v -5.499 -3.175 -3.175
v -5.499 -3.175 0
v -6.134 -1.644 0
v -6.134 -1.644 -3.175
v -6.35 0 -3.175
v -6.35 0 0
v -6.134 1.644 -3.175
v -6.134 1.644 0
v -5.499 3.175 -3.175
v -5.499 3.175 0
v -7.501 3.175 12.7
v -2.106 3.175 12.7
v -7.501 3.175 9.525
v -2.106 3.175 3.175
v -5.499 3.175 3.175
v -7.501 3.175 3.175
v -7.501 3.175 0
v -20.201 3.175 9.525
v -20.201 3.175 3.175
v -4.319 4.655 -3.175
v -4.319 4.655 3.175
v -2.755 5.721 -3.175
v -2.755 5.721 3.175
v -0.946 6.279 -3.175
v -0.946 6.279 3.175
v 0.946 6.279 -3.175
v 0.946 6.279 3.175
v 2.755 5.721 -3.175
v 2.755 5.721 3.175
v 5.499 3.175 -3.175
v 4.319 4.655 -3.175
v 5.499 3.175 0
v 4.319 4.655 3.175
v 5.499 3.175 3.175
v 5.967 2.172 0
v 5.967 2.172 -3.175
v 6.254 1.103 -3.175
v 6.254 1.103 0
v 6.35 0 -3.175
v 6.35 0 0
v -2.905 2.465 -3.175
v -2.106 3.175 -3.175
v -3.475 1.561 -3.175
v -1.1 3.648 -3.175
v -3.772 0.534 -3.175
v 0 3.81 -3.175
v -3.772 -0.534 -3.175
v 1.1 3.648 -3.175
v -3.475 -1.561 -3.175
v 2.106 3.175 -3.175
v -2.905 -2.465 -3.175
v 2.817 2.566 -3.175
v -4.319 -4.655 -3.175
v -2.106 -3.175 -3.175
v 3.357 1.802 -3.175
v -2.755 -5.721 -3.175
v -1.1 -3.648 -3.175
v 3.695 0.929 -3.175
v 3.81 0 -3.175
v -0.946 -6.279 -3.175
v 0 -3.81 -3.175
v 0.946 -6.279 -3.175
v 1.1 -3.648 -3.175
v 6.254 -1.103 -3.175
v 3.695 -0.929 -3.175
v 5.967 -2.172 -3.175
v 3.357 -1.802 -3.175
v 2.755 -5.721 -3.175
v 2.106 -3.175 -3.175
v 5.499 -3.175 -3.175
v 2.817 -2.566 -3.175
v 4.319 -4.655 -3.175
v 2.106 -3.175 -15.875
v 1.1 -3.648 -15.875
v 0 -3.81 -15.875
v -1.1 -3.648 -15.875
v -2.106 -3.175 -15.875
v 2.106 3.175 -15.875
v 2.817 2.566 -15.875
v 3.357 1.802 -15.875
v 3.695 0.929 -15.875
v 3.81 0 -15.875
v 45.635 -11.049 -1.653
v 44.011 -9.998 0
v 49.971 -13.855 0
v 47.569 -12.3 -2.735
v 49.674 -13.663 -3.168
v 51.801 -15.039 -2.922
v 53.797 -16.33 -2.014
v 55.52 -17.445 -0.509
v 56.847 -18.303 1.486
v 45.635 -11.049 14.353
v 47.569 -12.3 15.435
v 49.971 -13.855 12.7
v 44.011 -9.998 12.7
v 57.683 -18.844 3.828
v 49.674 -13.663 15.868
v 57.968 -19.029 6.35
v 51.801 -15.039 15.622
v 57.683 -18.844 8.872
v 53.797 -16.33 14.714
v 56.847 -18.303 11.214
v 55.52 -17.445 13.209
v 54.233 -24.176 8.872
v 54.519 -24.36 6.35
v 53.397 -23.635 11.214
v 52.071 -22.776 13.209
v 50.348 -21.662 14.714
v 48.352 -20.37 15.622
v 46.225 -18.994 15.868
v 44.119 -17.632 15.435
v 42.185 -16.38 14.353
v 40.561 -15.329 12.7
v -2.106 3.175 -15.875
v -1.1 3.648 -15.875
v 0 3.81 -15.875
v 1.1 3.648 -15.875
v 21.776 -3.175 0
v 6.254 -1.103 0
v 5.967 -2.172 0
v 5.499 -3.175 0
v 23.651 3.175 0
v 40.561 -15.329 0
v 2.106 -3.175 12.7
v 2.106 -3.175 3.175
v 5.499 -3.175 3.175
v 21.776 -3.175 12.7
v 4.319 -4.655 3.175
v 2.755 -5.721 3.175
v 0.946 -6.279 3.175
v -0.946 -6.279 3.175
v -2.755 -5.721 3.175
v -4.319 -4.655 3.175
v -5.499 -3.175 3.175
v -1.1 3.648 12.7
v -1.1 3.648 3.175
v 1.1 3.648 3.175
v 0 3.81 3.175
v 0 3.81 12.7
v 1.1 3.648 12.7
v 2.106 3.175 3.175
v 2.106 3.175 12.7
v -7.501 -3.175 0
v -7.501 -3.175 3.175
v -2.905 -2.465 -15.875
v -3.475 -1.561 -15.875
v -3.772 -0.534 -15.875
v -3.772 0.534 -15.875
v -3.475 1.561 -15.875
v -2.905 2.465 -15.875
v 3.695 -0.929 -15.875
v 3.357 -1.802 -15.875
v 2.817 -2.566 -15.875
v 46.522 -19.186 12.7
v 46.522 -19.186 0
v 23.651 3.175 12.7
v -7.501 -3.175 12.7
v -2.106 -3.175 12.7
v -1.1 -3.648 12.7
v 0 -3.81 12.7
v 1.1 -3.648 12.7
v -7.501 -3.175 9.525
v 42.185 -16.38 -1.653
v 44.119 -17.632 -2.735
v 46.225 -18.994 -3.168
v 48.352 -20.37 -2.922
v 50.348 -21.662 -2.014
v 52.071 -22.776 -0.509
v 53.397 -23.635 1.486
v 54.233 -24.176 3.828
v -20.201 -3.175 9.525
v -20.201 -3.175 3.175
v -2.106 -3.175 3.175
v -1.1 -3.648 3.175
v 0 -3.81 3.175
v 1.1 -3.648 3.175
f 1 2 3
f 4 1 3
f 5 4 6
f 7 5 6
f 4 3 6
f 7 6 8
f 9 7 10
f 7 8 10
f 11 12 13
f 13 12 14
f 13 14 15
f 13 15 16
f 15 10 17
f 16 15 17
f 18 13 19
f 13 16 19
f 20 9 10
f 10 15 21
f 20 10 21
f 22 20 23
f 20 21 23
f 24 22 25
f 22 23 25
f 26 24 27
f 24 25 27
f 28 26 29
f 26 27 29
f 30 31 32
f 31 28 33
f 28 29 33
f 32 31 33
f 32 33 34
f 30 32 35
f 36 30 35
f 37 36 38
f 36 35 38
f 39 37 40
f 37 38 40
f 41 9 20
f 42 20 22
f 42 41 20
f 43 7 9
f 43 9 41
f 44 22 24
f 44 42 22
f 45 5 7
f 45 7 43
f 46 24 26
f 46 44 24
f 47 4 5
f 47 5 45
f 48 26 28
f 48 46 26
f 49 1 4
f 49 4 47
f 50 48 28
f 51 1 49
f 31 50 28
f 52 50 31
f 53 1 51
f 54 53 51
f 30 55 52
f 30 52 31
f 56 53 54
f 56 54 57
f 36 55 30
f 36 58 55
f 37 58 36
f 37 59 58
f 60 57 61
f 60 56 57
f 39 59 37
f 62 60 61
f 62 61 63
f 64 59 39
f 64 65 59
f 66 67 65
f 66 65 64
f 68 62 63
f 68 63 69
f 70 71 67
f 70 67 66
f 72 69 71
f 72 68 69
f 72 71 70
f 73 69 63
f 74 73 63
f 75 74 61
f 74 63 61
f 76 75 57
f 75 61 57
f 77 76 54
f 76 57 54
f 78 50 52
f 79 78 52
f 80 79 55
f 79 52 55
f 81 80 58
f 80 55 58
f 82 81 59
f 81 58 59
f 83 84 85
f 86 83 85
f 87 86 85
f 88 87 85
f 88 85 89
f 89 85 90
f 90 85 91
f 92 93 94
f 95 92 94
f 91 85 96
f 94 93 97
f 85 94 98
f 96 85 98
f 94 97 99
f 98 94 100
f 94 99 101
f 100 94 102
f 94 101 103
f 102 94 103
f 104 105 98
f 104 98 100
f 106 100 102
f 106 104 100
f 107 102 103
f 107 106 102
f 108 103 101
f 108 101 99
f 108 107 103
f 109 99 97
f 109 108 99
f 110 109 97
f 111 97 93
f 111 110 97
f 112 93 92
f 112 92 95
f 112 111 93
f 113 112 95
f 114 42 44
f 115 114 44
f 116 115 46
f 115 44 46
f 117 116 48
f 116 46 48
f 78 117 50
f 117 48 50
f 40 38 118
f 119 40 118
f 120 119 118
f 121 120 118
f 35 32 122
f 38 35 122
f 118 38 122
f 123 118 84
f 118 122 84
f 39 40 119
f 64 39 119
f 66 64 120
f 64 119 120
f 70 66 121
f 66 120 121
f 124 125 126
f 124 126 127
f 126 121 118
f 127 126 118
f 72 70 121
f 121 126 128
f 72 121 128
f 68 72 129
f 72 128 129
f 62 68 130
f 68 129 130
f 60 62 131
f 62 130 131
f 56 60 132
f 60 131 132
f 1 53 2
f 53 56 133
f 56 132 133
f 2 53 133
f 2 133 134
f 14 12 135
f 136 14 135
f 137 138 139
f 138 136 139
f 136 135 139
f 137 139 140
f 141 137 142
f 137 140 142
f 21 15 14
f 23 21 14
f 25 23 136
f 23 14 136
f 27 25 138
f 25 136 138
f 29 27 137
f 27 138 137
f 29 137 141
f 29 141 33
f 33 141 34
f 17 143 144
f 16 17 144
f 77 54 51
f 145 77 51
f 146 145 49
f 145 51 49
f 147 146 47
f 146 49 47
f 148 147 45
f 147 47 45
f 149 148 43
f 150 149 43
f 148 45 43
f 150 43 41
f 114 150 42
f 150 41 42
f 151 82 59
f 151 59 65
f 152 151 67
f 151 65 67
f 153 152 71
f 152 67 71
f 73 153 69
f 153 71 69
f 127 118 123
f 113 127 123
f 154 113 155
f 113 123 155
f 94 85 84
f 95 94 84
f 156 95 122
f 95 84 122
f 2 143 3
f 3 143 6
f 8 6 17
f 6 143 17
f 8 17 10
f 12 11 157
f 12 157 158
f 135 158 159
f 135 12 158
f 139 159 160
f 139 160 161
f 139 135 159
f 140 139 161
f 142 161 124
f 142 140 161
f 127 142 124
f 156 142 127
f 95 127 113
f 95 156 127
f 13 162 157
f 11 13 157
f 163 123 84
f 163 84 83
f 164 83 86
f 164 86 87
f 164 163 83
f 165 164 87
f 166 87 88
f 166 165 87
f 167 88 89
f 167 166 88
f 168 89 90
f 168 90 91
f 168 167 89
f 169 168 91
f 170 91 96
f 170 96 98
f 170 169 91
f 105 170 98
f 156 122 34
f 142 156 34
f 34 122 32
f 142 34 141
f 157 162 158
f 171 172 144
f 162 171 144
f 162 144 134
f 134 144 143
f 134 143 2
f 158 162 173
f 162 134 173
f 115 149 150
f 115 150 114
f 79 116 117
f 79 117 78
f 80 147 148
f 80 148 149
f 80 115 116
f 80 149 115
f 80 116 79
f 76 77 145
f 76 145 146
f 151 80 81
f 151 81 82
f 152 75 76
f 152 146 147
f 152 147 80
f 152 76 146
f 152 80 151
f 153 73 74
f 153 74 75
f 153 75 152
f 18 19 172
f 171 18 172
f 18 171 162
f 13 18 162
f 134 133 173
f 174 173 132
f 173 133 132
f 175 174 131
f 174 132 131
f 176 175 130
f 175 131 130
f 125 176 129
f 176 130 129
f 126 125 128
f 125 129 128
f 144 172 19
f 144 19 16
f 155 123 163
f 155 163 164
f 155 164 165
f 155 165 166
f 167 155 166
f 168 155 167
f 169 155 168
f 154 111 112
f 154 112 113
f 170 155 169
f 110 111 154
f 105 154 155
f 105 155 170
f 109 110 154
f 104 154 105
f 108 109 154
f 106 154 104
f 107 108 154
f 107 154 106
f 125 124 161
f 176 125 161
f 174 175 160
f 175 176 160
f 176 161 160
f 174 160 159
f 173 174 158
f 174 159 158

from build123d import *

# Parameters (mm, degrees)
F1_DEPTH = 12.7
F3_DEPTH = 15.875
F4_DEPTH = 3.175
F6_DEPTH = 6.349999961
F7_W     = 12.7
F7_H     = 3.175
F8_DEPTH = 9.526


with BuildPart() as f1:
    # F0 (on Top) → F1 (new body)
    with BuildSketch(Plane.XY):
        with BuildLine():
            ThreePointArc((2.1060567419, -3.175), (3.3570951868, -1.8016692001), (3.81, 0))
            ThreePointArc((3.81, 0), (3.3570951868, 1.8016692001), (2.1060567419, 3.175))
            ThreePointArc((2.1060567419, 3.175), (0, 3.81), (-2.1060567419, 3.175))
            ThreePointArc((-2.1060567419, 3.175), (-3.81, 0), (-2.1060567419, -3.175))
            ThreePointArc((-2.1060567419, -3.175), (0, -3.81), (2.1060567419, -3.175))
        make_face()
        with BuildLine():
            ThreePointArc((2.1060567419, 3.175), (3.3570951868, 1.8016692001), (3.81, 0))
            ThreePointArc((3.81, 0), (3.3570951868, -1.8016692001), (2.1060567419, -3.175))
            Line((2.1060567419, -3.175), (21.7762735865, -3.175))
            Line((21.7762735865, -3.175), (46.5216673911, -19.1860459745))
            Line((46.5216673911, -19.1860459745), (49.9712098046, -13.8547087462))
            Line((49.9712098046, -13.8547087462), (23.6514521839, 3.175))
            Line((23.6514521839, 3.175), (2.1060567419, 3.175))
        make_face()
        with BuildLine():
            ThreePointArc((-2.1060567419, -3.175), (-3.81, 0), (-2.1060567419, 3.175))
            Line((-2.1060567419, 3.175), (-20.2012713999, 3.175))
            Line((-20.2012713999, 3.175), (-20.2012713999, -3.175))
            Line((-20.2012713999, -3.175), (-2.1060567419, -3.175))
        make_face()
    extrude(amount=F1_DEPTH)

    # F2 (on face) → F3 (join)
    with BuildSketch(Plane(origin=(0, 0, 0), x_dir=(1, 0, 0), z_dir=(0, 0, -1))):
        with BuildLine():
            ThreePointArc((2.1060567419, -3.175), (3.3570951868, -1.8016692001), (3.81, 0))
            ThreePointArc((3.81, 0), (3.3570951868, 1.8016692001), (2.1060567419, 3.175))
            ThreePointArc((2.1060567419, 3.175), (0, 3.81), (-2.1060567419, 3.175))
            ThreePointArc((-2.1060567419, 3.175), (-3.81, 0), (-2.1060567419, -3.175))
            ThreePointArc((-2.1060567419, -3.175), (0, -3.81), (2.1060567419, -3.175))
        make_face()
    extrude(amount=F3_DEPTH)

    # F2 (on face) → F4 (join, symmetric)
    with BuildSketch(Plane(origin=(0, 0, 0), x_dir=(1, 0, 0), z_dir=(0, 0, -1))):
        with BuildLine():
            ThreePointArc((2.1060567419, 3.175), (3.3570951868, 1.8016692001), (3.81, 0))
            ThreePointArc((3.81, 0), (3.3570951868, -1.8016692001), (2.1060567419, -3.175))
            Line((2.1060567419, -3.175), (5.499261314, -3.175))
            ThreePointArc((5.499261314, -3.175), (6.1336289969, -1.6435009364), (6.35, 0))
            ThreePointArc((6.35, 0), (6.1336289969, 1.6435009364), (5.499261314, 3.175))
            Line((5.499261314, 3.175), (2.1060567419, 3.175))
        make_face()
        with BuildLine():
            ThreePointArc((-2.1060567419, 3.175), (0, 3.81), (2.1060567419, 3.175))
            Line((2.1060567419, 3.175), (5.499261314, 3.175))
            ThreePointArc((5.499261314, 3.175), (0, 6.35), (-5.499261314, 3.175))
            Line((-5.499261314, 3.175), (-2.1060567419, 3.175))
        make_face()
        with BuildLine():
            Line((5.499261314, -3.175), (2.1060567419, -3.175))
            ThreePointArc((2.1060567419, -3.175), (0, -3.81), (-2.1060567419, -3.175))
            Line((-2.1060567419, -3.175), (-5.499261314, -3.175))
            ThreePointArc((-5.499261314, -3.175), (0, -6.35), (5.499261314, -3.175))
        make_face()
        with BuildLine():
            ThreePointArc((-2.1060567419, -3.175), (-3.81, 0), (-2.1060567419, 3.175))
            Line((-2.1060567419, 3.175), (-5.499261314, 3.175))
            ThreePointArc((-5.499261314, 3.175), (-6.35, 0), (-5.499261314, -3.175))
            Line((-5.499261314, -3.175), (-2.1060567419, -3.175))
        make_face()
    extrude(amount=F4_DEPTH, both=True)

    # F5 (on face) → F6 (join, through all)
    with BuildSketch(Plane(origin=(4.9781873283, 7.6938887107, 0), x_dir=(0.839580671, -0.5432350291, 0), z_dir=(-0.5432350291, -0.839580671, 0))):
        with BuildLine():
            ThreePointArc((42.3817091402, 0), (52.8799553739, -2.5479917191), (59.0062249688, 6.35))
            ThreePointArc((59.0062249688, 6.35), (52.8799553739, 15.2479917191), (42.3817091402, 12.7))
            Line((42.3817091402, 12.7), (49.4812249688, 12.7))
            Line((49.4812249688, 12.7), (49.4812249688, 0))
            Line((49.4812249688, 0), (42.3817091402, 0))
        make_face()
        with BuildLine():
            Line((49.4812249688, 12.7), (42.3817091402, 12.7))
            ThreePointArc((42.3817091402, 12.7), (39.9562249688, 6.35), (42.3817091402, 0))
            Line((42.3817091402, 0), (49.4812249688, 0))
            Line((49.4812249688, 0), (49.4812249688, 12.7))
        make_face()
    extrude(amount=-F6_DEPTH)

    # F7 (on face) → F8 (cut, through all)
    with BuildSketch(Plane.XZ.offset(3.175)):
        with Locations((-13.8512713999, 11.1125)):
            Rectangle(F7_W, F7_H)
        with Locations((-13.8512713999, 1.5875)):
            Rectangle(F7_W, F7_H)
    extrude(amount=-F8_DEPTH, mode=Mode.SUBTRACT)


solid = f1.part
